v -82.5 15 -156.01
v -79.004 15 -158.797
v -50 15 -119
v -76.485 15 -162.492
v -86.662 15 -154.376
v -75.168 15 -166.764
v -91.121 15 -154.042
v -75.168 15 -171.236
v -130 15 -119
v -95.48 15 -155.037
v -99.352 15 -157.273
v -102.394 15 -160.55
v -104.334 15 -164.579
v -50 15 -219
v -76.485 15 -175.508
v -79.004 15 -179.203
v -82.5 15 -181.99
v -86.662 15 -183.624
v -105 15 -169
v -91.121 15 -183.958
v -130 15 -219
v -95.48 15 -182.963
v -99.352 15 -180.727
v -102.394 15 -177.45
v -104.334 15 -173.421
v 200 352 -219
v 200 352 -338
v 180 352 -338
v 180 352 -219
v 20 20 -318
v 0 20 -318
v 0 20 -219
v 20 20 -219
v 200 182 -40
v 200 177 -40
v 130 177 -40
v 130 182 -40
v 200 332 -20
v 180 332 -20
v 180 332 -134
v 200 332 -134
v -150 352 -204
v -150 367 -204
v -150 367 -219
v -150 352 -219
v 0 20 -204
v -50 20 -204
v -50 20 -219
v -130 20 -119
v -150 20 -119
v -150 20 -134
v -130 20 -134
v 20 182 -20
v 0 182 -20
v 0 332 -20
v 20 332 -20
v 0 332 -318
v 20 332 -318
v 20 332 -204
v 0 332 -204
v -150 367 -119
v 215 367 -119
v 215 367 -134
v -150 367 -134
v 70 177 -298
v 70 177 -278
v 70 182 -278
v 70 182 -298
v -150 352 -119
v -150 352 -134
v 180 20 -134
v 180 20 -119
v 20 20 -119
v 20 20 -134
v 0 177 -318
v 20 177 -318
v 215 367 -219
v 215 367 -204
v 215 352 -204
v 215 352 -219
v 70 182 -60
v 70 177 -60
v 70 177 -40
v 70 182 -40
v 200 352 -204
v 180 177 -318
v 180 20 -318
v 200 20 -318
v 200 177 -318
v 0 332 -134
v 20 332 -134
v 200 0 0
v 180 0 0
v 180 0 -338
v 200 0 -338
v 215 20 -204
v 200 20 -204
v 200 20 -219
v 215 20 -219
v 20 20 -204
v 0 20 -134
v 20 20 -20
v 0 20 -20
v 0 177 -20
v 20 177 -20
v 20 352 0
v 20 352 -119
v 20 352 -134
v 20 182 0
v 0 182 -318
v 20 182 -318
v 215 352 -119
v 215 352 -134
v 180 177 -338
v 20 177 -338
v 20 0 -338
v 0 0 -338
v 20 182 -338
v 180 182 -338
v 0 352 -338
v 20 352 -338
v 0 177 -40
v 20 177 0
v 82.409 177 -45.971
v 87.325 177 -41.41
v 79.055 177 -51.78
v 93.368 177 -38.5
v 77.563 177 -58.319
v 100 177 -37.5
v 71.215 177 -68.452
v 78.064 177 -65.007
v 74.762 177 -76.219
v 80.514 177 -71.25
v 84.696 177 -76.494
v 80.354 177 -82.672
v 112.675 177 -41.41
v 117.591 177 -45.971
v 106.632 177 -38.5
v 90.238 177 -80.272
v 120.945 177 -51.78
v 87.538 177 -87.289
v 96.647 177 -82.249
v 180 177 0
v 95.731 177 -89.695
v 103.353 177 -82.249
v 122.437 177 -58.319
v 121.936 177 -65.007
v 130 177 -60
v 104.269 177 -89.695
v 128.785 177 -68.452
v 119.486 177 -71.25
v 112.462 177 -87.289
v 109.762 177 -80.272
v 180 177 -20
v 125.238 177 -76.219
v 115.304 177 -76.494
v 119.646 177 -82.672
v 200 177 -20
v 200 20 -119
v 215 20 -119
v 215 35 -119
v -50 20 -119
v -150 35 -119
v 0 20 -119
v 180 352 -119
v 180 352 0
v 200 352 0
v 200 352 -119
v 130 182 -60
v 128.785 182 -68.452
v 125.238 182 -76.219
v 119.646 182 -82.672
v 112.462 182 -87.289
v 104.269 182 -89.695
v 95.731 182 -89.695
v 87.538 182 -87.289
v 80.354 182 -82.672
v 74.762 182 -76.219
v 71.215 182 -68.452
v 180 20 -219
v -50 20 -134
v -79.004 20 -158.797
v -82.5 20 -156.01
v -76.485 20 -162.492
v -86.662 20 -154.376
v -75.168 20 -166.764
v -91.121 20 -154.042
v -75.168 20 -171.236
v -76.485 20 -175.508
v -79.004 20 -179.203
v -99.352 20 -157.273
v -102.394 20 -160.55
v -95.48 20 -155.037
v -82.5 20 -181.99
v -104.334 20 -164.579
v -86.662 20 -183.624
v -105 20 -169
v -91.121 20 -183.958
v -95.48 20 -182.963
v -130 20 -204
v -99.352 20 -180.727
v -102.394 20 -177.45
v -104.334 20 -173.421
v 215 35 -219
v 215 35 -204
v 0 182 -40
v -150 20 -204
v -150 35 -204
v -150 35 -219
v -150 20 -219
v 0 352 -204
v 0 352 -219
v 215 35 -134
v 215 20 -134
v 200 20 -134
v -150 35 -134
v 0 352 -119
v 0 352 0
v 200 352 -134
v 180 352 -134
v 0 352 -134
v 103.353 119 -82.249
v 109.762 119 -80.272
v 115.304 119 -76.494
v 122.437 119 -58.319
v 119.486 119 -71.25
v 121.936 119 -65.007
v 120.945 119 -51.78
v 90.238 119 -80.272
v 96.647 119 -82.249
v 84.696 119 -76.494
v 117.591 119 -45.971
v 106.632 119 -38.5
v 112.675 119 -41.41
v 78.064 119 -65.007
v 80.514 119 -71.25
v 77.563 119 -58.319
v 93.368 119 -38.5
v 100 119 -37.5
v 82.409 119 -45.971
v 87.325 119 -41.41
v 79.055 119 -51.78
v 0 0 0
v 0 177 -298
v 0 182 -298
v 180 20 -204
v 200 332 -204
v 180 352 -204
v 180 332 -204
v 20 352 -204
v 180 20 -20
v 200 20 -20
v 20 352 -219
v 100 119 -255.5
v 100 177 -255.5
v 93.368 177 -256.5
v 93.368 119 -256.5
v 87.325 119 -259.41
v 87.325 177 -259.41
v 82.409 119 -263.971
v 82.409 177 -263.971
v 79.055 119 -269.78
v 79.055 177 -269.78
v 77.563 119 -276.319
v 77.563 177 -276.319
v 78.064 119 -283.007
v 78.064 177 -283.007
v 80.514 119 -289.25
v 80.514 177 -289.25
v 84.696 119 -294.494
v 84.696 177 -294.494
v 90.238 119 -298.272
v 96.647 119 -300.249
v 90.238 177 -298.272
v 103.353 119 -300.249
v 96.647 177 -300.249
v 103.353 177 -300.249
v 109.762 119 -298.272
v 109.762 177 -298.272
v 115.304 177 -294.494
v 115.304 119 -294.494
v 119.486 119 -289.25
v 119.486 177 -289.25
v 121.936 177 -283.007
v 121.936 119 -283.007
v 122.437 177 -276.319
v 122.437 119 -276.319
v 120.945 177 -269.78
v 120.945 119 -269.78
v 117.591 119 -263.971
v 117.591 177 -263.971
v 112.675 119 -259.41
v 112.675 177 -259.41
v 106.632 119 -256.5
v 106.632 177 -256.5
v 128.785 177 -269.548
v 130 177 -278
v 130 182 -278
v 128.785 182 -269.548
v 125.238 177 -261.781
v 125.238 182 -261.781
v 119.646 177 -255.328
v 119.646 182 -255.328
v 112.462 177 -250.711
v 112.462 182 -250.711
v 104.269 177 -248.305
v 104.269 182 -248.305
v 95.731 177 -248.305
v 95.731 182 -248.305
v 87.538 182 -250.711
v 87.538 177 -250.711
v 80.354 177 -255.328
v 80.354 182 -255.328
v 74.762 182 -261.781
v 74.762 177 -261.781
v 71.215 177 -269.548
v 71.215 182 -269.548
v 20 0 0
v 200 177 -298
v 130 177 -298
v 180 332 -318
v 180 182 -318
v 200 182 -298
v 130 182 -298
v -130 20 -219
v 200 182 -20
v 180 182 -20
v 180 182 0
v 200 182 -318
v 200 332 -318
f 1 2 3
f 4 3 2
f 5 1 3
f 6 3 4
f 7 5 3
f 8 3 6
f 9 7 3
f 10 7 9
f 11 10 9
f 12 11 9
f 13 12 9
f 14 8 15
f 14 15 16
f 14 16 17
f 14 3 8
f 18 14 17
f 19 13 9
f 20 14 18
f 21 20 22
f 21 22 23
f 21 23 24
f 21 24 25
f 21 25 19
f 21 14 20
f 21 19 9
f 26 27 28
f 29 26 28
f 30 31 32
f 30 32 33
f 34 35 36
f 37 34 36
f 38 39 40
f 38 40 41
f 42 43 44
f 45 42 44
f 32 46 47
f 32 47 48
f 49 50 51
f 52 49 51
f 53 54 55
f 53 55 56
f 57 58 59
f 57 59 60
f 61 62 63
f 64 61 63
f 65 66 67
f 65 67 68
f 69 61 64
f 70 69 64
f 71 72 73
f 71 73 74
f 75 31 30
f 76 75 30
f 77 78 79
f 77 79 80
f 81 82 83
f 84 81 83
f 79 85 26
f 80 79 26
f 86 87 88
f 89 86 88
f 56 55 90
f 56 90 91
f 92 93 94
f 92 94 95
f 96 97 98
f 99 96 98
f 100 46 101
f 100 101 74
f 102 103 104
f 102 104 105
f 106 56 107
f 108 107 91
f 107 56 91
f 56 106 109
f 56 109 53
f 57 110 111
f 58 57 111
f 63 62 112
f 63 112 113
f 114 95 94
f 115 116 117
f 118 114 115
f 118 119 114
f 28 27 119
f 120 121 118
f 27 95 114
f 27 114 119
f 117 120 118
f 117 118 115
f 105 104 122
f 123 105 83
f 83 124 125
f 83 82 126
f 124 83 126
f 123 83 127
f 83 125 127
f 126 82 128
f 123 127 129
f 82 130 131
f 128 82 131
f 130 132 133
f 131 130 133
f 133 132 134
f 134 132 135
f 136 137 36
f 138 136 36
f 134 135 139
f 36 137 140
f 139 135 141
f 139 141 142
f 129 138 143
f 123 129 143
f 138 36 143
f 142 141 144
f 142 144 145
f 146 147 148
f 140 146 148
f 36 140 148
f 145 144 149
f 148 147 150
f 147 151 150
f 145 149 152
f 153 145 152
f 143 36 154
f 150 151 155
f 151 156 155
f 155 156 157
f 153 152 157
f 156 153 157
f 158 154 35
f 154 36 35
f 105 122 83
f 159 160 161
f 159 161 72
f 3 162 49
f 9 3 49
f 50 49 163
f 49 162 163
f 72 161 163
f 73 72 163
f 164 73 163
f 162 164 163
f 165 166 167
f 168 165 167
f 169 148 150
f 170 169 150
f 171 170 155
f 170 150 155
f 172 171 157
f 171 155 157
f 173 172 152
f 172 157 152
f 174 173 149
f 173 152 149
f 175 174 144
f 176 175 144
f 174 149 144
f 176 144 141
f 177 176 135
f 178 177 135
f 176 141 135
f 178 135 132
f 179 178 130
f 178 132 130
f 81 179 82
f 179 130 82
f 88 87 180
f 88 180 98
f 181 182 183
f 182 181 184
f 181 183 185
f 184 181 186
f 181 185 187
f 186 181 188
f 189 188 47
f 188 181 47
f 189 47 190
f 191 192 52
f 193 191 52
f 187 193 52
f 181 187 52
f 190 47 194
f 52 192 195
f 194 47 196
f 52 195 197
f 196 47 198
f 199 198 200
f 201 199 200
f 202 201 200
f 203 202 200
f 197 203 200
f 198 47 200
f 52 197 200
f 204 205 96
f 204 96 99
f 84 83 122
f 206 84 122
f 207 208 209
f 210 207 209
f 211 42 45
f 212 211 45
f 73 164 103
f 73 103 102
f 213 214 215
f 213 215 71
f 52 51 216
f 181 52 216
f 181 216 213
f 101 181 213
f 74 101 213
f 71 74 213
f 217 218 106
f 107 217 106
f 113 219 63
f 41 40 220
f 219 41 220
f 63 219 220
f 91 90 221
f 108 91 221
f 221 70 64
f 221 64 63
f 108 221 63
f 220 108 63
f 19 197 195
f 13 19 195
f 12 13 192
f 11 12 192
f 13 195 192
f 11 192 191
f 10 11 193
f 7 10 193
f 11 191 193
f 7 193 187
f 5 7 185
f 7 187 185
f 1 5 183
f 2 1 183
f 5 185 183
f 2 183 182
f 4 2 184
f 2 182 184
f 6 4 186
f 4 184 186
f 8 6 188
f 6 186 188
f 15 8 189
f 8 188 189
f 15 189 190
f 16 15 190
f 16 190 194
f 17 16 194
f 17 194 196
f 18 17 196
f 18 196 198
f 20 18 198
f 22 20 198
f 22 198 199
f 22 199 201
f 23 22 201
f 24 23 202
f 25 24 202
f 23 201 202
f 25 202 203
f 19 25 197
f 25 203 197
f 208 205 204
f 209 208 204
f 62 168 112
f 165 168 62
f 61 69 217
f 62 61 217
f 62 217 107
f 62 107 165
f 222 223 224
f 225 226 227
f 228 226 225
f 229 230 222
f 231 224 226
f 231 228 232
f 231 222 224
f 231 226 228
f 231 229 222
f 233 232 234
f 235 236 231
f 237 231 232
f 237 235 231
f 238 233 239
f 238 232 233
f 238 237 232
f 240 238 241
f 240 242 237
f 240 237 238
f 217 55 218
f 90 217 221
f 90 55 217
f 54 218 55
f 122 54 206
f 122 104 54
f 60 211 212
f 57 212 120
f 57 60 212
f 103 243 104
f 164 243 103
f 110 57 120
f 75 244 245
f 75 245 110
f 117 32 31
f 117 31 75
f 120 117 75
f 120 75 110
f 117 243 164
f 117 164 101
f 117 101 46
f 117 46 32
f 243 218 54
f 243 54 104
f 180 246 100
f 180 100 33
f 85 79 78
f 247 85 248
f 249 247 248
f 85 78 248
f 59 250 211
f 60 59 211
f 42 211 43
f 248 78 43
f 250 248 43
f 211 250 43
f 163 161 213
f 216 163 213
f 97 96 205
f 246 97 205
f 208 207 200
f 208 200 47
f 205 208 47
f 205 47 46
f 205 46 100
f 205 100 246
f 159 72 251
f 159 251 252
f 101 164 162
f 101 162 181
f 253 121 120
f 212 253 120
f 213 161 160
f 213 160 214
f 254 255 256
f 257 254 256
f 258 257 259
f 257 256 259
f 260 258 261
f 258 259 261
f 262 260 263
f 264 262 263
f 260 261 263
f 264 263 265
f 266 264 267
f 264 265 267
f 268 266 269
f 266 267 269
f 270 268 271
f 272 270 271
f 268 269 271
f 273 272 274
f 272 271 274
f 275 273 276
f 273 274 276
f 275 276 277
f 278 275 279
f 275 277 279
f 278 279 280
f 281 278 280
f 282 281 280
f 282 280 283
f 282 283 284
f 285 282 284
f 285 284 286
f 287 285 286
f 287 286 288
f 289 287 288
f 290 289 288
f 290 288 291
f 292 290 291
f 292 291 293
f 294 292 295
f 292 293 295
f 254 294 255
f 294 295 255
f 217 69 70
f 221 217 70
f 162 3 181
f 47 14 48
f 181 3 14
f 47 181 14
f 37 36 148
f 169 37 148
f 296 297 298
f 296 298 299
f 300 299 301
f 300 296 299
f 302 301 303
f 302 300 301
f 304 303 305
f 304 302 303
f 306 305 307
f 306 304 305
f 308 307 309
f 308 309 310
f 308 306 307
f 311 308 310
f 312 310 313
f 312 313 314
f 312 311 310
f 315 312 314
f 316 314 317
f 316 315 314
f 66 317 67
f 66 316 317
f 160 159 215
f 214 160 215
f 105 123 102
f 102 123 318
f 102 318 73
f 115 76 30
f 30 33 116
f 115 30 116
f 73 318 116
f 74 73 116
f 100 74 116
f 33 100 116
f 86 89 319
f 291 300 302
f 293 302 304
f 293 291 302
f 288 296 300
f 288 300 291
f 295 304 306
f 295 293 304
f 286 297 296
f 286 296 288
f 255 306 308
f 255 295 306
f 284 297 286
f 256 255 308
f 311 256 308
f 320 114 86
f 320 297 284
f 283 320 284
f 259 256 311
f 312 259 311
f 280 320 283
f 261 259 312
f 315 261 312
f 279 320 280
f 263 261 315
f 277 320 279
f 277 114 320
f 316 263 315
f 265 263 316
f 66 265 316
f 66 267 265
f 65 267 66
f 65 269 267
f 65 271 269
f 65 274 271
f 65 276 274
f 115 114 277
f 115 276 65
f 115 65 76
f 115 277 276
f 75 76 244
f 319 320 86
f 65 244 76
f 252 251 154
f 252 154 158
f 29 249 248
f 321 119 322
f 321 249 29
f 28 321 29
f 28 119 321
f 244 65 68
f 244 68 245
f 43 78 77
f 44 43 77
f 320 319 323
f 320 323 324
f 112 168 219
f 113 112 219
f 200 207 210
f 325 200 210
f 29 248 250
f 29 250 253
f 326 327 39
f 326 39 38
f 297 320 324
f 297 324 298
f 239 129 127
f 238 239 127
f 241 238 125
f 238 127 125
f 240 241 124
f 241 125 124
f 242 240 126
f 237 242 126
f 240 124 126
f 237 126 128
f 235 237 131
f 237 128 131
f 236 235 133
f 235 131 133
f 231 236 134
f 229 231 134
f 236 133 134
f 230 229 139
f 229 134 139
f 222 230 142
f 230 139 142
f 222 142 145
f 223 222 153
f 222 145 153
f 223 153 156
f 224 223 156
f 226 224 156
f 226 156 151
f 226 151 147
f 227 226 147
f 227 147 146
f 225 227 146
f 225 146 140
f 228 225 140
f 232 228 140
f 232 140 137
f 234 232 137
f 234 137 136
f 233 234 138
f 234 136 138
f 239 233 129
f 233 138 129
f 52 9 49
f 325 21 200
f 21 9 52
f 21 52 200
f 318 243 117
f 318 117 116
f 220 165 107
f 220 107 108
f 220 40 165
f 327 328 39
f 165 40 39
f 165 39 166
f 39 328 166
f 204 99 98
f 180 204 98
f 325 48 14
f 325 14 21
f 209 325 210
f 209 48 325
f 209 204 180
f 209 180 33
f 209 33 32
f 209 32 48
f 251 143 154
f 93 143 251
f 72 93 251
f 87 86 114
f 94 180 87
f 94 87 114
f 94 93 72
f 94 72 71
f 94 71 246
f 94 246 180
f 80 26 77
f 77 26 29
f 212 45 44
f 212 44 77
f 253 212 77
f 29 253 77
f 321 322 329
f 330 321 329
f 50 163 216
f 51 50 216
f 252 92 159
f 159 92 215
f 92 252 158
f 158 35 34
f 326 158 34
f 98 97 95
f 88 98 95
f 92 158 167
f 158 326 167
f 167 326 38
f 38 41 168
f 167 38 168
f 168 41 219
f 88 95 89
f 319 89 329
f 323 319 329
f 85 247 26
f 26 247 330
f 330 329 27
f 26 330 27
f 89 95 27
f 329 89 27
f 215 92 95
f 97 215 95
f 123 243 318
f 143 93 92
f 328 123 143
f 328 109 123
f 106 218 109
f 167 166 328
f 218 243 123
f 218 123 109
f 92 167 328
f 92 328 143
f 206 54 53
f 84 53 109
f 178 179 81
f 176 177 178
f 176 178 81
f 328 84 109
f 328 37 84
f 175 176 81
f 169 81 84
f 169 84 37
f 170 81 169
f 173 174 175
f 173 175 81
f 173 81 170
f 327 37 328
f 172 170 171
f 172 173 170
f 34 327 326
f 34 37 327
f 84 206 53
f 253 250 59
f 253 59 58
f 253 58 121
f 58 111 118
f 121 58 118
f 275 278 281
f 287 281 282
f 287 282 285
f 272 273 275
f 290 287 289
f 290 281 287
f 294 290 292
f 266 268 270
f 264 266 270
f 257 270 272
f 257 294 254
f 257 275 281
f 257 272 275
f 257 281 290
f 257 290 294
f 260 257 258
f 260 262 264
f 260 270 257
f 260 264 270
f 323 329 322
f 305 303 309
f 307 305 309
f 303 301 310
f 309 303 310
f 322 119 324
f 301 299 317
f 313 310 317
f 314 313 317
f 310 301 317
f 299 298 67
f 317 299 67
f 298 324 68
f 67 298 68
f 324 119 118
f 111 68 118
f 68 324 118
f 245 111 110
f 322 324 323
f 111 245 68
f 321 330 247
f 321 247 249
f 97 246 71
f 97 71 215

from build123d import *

# Parameters (mm, degrees)
SKETCH_1_W            = 20
SKETCH_1_H            = 338
EXTRUDE_1_DEPTH       = 20
EXTRUDE_1_2_DEPTH     = 20
SKETCH_2_W            = 20
SKETCH_2_H            = 20
EXTRUDE_2_DEPTH       = 157
EXTRUDE_4_DEPTH       = 5
SKETCH_6_R            = 22.5
EXTRUDE_5_DEPTH       = 58
EXTRUDE_6_DEPTH       = 15
EXTRUDE_6_DEPTH_BACK  = 350
SKETCH_7_W            = 15
SKETCH_7_H            = 15
SKETCH_12_W           = 20
SKETCH_12_H           = 20
EXTRUDE_10_DEPTH      = 150
SKETCH_13_W           = 20
SKETCH_13_H           = 20
EXTRUDE_11_DEPTH      = 134
SKETCH_14_W           = 20
SKETCH_14_H           = 20
EXTRUDE_12_DEPTH      = 134
EXTRUDE_13_DEPTH      = 15
EXTRUDE_13_DEPTH_BACK = 350
SKETCH_15_W           = 15
SKETCH_15_H           = 15
SKETCH_19_W           = 80
SKETCH_19_H           = 5
EXTRUDE_15_DEPTH      = 100
SKETCH_20_R           = 15
CUT_EXTRUDE_1_DEPTH   = 5


with BuildPart() as part:
    # 草图1 → 凸台-拉伸1 (new body)
    with BuildSketch(Plane(origin=(0, 0, 0), x_dir=(1, 0, 0), z_dir=(0, 1, 0))):
        with Locations((10, 169)):
            Rectangle(SKETCH_1_W, SKETCH_1_H)
    extrude(amount=EXTRUDE_1_DEPTH)



with BuildPart() as body_2:
    # 草图1 → Extrude 1 2 (new body)
    with BuildSketch(Plane(origin=(0, 0, 0), x_dir=(1, 0, 0), z_dir=(0, 1, 0))):
        with Locations((190, 169)):
            Rectangle(SKETCH_1_W, SKETCH_1_H)
    extrude(amount=EXTRUDE_1_2_DEPTH)


with BuildPart() as part_1:
    add(part.part)

    add(body_2.part)  # 凸台-拉伸2 merges body 2
    # 草图2 → 凸台-拉伸2 (add)
    with BuildSketch(Plane(origin=(0, 20, 0), x_dir=(1, 0, 0), z_dir=(0, 1, 0))):
        with Locations((10, 328)):
            Rectangle(SKETCH_2_W, SKETCH_2_H)
        with Locations((190, 328)):
            Rectangle(SKETCH_2_W, SKETCH_2_H)
        with Locations((190, 10)):
            Rectangle(SKETCH_2_W, SKETCH_2_H)
        with Locations((10, 10)):
            Rectangle(SKETCH_2_W, SKETCH_2_H)
    extrude(amount=EXTRUDE_2_DEPTH)

    # 草图5 → 凸台-拉伸4 (add)
    with BuildSketch(Plane(origin=(0, 177, 0), x_dir=(1, 0, 0), z_dir=(0, 1, 0))):
        with BuildLine():
            Line((0, 0), (200, 0))
            Line((200, 0), (200, 40))
            Line((200, 40), (130, 40))
            Line((130, 40), (130, 60))
            ThreePointArc((130, 60), (100, 90), (70, 60))
            Line((70, 60), (70, 40))
            Line((70, 40), (0, 40))
            Line((0, 40), (0, 0))
        make_face()
        with BuildLine():
            Line((0, 338), (200, 338))
            Line((200, 338), (200, 298))
            Line((200, 298), (130, 298))
            Line((130, 298), (130, 278))
            ThreePointArc((130, 278), (100, 248), (70, 278))
            Line((70, 278), (70, 298))
            Line((70, 298), (0, 298))
            Line((0, 298), (0, 338))
        make_face()
    extrude(amount=EXTRUDE_4_DEPTH)

    # 草图6 → 凸台-拉伸5 (add)
    with BuildSketch(Plane(origin=(0, 177, 0), x_dir=(-1, 0, 0), z_dir=(0, -1, 0))):
        with Locations((-100, 60)):
            Circle(SKETCH_6_R)
        with Locations((-100, 278)):
            Circle(SKETCH_6_R)
    extrude(amount=EXTRUDE_5_DEPTH)

    # 草图7 → 凸台-拉伸6 (add, two sides: drawn at the far end of the back side and taken through both)
    with BuildSketch(Plane(origin=(200, 0, 0), x_dir=(0, 0, -1), z_dir=(1, 0, 0)).offset(-EXTRUDE_6_DEPTH_BACK)):
        with Locations((126.5, 27.5)):
            Rectangle(SKETCH_7_W, SKETCH_7_H)
        with Locations((211.5, 27.5)):
            Rectangle(SKETCH_7_W, SKETCH_7_H)
    extrude(amount=EXTRUDE_6_DEPTH + EXTRUDE_6_DEPTH_BACK)

    # 草图12 → 凸台-拉伸10 (add)
    with BuildSketch(Plane(origin=(0, 182, 0), x_dir=(1, 0, 0), z_dir=(0, 1, 0))):
        with Locations((10, 328)):
            Rectangle(SKETCH_12_W, SKETCH_12_H)
        with Locations((190, 328)):
            Rectangle(SKETCH_12_W, SKETCH_12_H)
        with Locations((10, 10)):
            Rectangle(SKETCH_12_W, SKETCH_12_H)
        with Locations((190, 10)):
            Rectangle(SKETCH_12_W, SKETCH_12_H)
    extrude(amount=EXTRUDE_10_DEPTH)

    # 草图13 → 凸台-拉伸11 (add)
    with BuildSketch(Plane.XY):
        with Locations((190, 342)):
            Rectangle(SKETCH_13_W, SKETCH_13_H)
        with Locations((10, 342)):
            Rectangle(SKETCH_13_W, SKETCH_13_H)
    extrude(amount=-EXTRUDE_11_DEPTH)

    # 草图14 → 凸台-拉伸12 (add)
    with BuildSketch(Plane(origin=(0, 0, -338), x_dir=(-1, 0, 0), z_dir=(0, 0, -1))):
        with Locations((-190, 342)):
            Rectangle(SKETCH_14_W, SKETCH_14_H)
        with Locations((-10, 342)):
            Rectangle(SKETCH_14_W, SKETCH_14_H)
    extrude(amount=-EXTRUDE_12_DEPTH)

    # 草图15 → 凸台-拉伸13 (add, two sides: drawn at the far end of the back side and taken through both)
    with BuildSketch(Plane(origin=(200, 0, 0), x_dir=(0, 0, -1), z_dir=(1, 0, 0)).offset(-EXTRUDE_13_DEPTH_BACK)):
        with Locations((126.5, 359.5)):
            Rectangle(SKETCH_15_W, SKETCH_15_H)
        with Locations((211.5, 359.5)):
            Rectangle(SKETCH_15_W, SKETCH_15_H)
    extrude(amount=EXTRUDE_13_DEPTH + EXTRUDE_13_DEPTH_BACK)

    # 草图19 → 凸台-拉伸15 (add)
    with BuildSketch(Plane(origin=(0, 0, -219), x_dir=(-1, 0, 0), z_dir=(0, 0, -1))):
        with Locations((90, 17.5)):
            Rectangle(SKETCH_19_W, SKETCH_19_H)
    extrude(amount=-EXTRUDE_15_DEPTH)

    # 草图20 → 切除-拉伸1 (cut)
    with BuildSketch(Plane(origin=(0, 20, 0), x_dir=(1, 0, 0), z_dir=(0, 1, 0))):
        with Locations((-90, 169)):
            Circle(SKETCH_20_R)
    extrude(amount=-CUT_EXTRUDE_1_DEPTH, mode=Mode.SUBTRACT)


solid = part_1.part
